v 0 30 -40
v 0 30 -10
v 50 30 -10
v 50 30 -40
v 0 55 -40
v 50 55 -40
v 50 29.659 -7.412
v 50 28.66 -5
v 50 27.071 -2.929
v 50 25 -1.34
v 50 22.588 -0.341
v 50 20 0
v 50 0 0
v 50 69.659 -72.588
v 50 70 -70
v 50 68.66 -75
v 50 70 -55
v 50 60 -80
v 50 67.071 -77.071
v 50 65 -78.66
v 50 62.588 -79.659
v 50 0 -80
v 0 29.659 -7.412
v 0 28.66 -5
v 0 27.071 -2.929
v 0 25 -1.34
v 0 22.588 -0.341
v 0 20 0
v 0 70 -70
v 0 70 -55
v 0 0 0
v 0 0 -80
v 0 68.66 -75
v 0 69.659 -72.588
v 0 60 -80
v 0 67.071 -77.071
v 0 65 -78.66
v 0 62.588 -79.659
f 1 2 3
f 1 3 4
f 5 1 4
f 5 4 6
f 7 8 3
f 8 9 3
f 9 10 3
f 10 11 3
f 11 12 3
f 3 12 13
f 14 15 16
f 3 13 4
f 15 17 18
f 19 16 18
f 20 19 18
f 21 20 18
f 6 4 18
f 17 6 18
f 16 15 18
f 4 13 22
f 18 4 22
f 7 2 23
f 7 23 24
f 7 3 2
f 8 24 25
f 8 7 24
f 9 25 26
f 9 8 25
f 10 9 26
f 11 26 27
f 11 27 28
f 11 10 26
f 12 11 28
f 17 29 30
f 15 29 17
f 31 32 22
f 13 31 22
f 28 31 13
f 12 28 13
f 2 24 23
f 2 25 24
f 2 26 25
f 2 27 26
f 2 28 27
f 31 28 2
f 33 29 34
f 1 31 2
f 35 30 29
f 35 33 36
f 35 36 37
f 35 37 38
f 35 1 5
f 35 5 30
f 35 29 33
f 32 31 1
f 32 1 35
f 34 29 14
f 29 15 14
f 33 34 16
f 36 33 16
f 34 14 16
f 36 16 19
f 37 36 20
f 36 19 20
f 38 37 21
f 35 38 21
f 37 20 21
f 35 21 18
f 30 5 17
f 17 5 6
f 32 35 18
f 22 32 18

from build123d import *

# Parameters (mm, degrees)
ESBO_O1_W                  = 50
ESBO_O1_H                  = 80
RESSALTO_EXTRUS_O1_DEPTH   = 70
CORTE_EXTRUS_O1_DEPTH      = 118.473401245
CORTE_EXTRUS_O1_DEPTH_BACK = 118.473401245
ESBO_O2_W                  = 40
ESBO_O2_H                  = 40
CHANFRO1_SIZE              = 15
FILETE1_R                  = 10


with BuildPart() as part:
    # Esboço1 → Ressalto-extrusão1 (new body)
    with BuildSketch(Plane(origin=(0, 0, 0), x_dir=(1, 0, 0), z_dir=(0, 1, 0))):
        with Locations((25, 40)):
            Rectangle(ESBO_O1_W, ESBO_O1_H)
    extrude(amount=RESSALTO_EXTRUS_O1_DEPTH)

    # Esboço2 → Corte-extrusão1 (cut, two sides: drawn at the far end of the back side and taken through both)
    with BuildSketch(Plane(origin=(50, 0, 0), x_dir=(0, 0, -1), z_dir=(1, 0, 0)).offset(-CORTE_EXTRUS_O1_DEPTH_BACK)):
        with Locations((20, 50)):
            Rectangle(ESBO_O2_W, ESBO_O2_H)
    extrude(amount=CORTE_EXTRUS_O1_DEPTH + CORTE_EXTRUS_O1_DEPTH_BACK, mode=Mode.SUBTRACT)

    # Chanfro1
    chanfro1_edges = [part.edges().sort_by_distance(p)[0] for p in [
        (25, 70, -40),
    ]]
    chamfer(chanfro1_edges, length=CHANFRO1_SIZE)

    # Filete1
    filete1_edges = [part.edges().sort_by_distance(p)[0] for p in [
        (25, 70, -80),
        (25, 30, 0),
    ]]
    fillet(filete1_edges, radius=FILETE1_R)


solid = part.part
